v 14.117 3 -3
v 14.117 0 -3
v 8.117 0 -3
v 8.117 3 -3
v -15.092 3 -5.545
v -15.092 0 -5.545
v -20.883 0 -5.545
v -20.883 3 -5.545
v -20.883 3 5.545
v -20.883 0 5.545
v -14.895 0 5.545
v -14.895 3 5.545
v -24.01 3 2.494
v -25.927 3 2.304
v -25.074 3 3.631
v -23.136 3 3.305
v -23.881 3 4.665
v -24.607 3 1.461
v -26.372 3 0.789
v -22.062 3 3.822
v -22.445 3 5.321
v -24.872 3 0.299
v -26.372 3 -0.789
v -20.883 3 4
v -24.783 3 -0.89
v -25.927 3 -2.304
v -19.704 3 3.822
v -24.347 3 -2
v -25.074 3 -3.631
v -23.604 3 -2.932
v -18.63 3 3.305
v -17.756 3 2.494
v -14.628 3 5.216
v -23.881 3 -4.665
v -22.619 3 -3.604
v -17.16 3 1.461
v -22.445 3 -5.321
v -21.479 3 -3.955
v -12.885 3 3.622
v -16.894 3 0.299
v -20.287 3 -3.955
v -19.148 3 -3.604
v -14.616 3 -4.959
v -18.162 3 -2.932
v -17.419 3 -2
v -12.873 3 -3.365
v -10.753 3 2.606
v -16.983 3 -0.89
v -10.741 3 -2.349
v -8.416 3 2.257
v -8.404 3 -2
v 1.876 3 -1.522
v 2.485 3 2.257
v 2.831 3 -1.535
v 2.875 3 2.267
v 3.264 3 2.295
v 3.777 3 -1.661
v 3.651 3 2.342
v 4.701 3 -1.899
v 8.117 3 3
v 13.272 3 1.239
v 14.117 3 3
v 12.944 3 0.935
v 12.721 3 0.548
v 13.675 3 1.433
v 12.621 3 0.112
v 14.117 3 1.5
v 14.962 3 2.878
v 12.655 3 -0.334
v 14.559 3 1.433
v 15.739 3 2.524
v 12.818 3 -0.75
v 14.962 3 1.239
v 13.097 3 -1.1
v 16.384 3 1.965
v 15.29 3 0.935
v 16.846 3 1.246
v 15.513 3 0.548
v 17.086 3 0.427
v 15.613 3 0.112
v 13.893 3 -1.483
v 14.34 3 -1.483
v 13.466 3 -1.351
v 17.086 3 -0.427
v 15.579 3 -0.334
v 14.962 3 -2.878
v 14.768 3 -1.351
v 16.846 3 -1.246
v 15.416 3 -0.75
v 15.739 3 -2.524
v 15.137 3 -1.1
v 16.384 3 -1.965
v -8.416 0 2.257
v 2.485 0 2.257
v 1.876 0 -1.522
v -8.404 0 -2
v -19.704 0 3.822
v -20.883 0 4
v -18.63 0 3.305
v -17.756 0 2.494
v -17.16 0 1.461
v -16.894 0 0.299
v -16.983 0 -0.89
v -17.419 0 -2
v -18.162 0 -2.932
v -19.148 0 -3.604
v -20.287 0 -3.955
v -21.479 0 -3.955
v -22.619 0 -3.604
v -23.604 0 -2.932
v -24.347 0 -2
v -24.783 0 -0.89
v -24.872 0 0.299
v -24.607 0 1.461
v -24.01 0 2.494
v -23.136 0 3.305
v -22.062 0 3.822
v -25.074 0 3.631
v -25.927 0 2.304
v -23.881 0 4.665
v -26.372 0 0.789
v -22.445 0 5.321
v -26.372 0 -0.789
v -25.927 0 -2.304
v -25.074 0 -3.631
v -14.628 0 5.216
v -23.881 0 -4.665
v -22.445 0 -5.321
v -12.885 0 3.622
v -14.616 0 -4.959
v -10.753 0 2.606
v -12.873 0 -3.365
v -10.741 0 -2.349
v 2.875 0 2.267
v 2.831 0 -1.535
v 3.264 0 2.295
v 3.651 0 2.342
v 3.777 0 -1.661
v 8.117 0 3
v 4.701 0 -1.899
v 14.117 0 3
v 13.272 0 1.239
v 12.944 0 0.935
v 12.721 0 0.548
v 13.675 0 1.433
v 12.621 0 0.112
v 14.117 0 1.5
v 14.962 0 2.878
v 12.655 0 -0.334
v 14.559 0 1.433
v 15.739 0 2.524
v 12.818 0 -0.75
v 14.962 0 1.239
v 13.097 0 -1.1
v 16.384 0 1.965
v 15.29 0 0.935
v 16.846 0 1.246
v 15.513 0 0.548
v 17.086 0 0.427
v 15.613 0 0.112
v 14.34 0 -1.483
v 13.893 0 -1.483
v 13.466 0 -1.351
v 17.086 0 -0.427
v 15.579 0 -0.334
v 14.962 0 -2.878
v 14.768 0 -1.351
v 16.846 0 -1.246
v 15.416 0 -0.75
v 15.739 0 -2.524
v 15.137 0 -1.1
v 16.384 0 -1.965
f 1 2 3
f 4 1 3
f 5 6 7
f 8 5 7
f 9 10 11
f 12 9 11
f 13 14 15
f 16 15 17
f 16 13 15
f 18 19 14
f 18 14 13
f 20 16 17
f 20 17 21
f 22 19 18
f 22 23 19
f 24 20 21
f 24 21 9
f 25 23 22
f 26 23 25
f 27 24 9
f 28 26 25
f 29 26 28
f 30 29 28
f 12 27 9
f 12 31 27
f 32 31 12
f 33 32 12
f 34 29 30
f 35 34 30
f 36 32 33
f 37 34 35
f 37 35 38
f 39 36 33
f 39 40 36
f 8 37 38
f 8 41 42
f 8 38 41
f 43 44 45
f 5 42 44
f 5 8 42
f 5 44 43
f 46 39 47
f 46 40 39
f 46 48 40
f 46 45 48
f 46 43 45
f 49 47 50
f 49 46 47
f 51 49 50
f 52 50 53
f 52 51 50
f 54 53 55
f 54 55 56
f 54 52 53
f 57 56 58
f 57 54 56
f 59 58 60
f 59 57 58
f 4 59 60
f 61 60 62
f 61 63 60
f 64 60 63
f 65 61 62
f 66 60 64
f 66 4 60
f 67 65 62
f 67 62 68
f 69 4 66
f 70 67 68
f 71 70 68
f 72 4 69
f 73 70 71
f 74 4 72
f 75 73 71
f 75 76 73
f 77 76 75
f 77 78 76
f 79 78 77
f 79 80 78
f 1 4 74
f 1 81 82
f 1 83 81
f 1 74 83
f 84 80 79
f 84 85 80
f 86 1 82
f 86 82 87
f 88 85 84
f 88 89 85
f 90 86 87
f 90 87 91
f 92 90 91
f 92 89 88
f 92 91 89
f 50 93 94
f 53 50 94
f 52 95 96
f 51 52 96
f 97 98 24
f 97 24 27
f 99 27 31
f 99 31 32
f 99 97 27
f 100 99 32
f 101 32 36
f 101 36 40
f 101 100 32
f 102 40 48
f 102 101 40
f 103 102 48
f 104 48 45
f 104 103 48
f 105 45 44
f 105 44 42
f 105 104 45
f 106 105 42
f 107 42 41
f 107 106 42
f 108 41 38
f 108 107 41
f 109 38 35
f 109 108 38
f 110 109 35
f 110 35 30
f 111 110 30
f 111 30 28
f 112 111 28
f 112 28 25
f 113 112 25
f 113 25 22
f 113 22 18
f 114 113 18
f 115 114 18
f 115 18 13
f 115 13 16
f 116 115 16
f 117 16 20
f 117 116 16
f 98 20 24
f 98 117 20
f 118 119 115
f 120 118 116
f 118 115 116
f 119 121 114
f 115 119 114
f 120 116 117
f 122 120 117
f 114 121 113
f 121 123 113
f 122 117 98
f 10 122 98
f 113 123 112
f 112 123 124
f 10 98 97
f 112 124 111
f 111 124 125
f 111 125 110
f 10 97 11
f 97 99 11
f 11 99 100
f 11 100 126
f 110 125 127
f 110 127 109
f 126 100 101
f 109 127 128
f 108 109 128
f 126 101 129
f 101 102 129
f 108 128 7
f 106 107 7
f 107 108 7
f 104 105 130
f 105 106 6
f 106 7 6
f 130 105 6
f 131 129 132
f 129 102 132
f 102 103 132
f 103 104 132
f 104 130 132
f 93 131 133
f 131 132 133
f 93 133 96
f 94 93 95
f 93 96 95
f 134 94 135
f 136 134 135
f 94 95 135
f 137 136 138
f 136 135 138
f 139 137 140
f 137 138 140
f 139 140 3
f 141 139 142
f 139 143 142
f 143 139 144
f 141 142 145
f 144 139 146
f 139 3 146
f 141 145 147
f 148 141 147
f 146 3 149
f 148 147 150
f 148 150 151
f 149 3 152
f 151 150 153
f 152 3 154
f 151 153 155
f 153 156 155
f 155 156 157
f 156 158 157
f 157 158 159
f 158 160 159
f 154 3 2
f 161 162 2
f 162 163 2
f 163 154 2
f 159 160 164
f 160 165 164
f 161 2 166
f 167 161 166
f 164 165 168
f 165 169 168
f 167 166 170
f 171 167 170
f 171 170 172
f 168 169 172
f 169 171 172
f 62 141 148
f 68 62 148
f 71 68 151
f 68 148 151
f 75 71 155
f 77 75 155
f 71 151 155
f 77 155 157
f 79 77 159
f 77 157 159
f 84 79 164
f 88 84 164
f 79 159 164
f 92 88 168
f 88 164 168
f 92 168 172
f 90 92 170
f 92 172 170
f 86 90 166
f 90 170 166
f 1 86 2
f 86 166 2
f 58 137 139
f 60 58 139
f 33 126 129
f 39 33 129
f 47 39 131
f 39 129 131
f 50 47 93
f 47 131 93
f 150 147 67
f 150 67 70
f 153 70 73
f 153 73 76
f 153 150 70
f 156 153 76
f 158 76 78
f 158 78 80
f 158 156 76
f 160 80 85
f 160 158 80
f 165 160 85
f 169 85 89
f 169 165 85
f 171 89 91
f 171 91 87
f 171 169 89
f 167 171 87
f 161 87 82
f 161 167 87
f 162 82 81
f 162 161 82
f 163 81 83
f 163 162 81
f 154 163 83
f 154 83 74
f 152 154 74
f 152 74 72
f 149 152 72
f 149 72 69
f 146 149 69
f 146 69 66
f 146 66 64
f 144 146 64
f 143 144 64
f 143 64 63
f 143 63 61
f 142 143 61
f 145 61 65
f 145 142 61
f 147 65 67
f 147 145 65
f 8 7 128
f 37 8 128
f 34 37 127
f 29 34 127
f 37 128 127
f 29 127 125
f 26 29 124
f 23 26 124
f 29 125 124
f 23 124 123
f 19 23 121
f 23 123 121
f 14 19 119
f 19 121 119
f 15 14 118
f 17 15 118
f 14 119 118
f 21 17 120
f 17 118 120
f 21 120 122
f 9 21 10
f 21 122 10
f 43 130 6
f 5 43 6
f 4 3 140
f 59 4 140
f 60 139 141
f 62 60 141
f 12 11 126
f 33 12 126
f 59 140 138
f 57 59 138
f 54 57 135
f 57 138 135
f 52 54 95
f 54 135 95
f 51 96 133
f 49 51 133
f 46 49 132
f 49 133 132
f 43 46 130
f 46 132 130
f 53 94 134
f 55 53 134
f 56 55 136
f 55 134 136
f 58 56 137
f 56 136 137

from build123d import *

# Parameters (mm, degrees)
SKETCH1_R           = 4
SKETCH1_R_2         = 1.5
BOSS_EXTRUDE1_DEPTH = 3


with BuildPart() as part:
    # Sketch1 → Boss-Extrude1 (new body)
    with BuildSketch(Plane(origin=(0, 0, 0), x_dir=(1, 0, 0), z_dir=(0, 1, 0))):
        with BuildLine():
            Line((8.116924874, 3), (4.701194702, 1.899288849))
            ThreePointArc((4.701194702, 1.899288849), (3.305590689, 1.583983301), (1.876141193, 1.522320606))
            Line((1.876141193, 1.522320606), (-8.40404093, 2))
            ThreePointArc((-8.40404093, 2), (-11.844657575, 2.777662629), (-14.616364474, 4.959460725))
            Line((-14.616364474, 4.959460725), (-15.091625453, 5.545206576))
            Line((-15.091625453, 5.545206576), (-20.883075126, 5.545206576))
            ThreePointArc((-20.883075126, 5.545206576), (-26.428281702, 0), (-20.883075126, -5.545206576))
            Line((-20.883075126, -5.545206576), (-14.895018407, -5.545206576))
            Line((-14.895018407, -5.545206576), (-14.628307755, -5.216493164))
            ThreePointArc((-14.628307755, -5.216493164), (-11.856600856, -3.034695068), (-8.415984211, -2.257032439))
            Line((-8.415984211, -2.257032439), (2.485375874, -2.257032439))
            ThreePointArc((2.485375874, -2.257032439), (3.06964146, -2.278396358), (3.650786495, -2.342374008))
            Line((3.650786495, -2.342374008), (8.116924874, -3))
            Line((8.116924874, -3), (14.116924874, -3))
            ThreePointArc((14.116924874, -3), (17.116924874, 0), (14.116924874, 3))
            Line((14.116924874, 3), (8.116924874, 3))
        make_face()
        with Locations(Location((-20.883075126, 0, 0), (0, 0, 270))):
            Circle(SKETCH1_R, mode=Mode.SUBTRACT)
        with Locations(Location((14.116924874, 0, 0), (0, 0, 270))):
            Circle(SKETCH1_R_2, mode=Mode.SUBTRACT)
    extrude(amount=BOSS_EXTRUDE1_DEPTH)


solid = part.part
